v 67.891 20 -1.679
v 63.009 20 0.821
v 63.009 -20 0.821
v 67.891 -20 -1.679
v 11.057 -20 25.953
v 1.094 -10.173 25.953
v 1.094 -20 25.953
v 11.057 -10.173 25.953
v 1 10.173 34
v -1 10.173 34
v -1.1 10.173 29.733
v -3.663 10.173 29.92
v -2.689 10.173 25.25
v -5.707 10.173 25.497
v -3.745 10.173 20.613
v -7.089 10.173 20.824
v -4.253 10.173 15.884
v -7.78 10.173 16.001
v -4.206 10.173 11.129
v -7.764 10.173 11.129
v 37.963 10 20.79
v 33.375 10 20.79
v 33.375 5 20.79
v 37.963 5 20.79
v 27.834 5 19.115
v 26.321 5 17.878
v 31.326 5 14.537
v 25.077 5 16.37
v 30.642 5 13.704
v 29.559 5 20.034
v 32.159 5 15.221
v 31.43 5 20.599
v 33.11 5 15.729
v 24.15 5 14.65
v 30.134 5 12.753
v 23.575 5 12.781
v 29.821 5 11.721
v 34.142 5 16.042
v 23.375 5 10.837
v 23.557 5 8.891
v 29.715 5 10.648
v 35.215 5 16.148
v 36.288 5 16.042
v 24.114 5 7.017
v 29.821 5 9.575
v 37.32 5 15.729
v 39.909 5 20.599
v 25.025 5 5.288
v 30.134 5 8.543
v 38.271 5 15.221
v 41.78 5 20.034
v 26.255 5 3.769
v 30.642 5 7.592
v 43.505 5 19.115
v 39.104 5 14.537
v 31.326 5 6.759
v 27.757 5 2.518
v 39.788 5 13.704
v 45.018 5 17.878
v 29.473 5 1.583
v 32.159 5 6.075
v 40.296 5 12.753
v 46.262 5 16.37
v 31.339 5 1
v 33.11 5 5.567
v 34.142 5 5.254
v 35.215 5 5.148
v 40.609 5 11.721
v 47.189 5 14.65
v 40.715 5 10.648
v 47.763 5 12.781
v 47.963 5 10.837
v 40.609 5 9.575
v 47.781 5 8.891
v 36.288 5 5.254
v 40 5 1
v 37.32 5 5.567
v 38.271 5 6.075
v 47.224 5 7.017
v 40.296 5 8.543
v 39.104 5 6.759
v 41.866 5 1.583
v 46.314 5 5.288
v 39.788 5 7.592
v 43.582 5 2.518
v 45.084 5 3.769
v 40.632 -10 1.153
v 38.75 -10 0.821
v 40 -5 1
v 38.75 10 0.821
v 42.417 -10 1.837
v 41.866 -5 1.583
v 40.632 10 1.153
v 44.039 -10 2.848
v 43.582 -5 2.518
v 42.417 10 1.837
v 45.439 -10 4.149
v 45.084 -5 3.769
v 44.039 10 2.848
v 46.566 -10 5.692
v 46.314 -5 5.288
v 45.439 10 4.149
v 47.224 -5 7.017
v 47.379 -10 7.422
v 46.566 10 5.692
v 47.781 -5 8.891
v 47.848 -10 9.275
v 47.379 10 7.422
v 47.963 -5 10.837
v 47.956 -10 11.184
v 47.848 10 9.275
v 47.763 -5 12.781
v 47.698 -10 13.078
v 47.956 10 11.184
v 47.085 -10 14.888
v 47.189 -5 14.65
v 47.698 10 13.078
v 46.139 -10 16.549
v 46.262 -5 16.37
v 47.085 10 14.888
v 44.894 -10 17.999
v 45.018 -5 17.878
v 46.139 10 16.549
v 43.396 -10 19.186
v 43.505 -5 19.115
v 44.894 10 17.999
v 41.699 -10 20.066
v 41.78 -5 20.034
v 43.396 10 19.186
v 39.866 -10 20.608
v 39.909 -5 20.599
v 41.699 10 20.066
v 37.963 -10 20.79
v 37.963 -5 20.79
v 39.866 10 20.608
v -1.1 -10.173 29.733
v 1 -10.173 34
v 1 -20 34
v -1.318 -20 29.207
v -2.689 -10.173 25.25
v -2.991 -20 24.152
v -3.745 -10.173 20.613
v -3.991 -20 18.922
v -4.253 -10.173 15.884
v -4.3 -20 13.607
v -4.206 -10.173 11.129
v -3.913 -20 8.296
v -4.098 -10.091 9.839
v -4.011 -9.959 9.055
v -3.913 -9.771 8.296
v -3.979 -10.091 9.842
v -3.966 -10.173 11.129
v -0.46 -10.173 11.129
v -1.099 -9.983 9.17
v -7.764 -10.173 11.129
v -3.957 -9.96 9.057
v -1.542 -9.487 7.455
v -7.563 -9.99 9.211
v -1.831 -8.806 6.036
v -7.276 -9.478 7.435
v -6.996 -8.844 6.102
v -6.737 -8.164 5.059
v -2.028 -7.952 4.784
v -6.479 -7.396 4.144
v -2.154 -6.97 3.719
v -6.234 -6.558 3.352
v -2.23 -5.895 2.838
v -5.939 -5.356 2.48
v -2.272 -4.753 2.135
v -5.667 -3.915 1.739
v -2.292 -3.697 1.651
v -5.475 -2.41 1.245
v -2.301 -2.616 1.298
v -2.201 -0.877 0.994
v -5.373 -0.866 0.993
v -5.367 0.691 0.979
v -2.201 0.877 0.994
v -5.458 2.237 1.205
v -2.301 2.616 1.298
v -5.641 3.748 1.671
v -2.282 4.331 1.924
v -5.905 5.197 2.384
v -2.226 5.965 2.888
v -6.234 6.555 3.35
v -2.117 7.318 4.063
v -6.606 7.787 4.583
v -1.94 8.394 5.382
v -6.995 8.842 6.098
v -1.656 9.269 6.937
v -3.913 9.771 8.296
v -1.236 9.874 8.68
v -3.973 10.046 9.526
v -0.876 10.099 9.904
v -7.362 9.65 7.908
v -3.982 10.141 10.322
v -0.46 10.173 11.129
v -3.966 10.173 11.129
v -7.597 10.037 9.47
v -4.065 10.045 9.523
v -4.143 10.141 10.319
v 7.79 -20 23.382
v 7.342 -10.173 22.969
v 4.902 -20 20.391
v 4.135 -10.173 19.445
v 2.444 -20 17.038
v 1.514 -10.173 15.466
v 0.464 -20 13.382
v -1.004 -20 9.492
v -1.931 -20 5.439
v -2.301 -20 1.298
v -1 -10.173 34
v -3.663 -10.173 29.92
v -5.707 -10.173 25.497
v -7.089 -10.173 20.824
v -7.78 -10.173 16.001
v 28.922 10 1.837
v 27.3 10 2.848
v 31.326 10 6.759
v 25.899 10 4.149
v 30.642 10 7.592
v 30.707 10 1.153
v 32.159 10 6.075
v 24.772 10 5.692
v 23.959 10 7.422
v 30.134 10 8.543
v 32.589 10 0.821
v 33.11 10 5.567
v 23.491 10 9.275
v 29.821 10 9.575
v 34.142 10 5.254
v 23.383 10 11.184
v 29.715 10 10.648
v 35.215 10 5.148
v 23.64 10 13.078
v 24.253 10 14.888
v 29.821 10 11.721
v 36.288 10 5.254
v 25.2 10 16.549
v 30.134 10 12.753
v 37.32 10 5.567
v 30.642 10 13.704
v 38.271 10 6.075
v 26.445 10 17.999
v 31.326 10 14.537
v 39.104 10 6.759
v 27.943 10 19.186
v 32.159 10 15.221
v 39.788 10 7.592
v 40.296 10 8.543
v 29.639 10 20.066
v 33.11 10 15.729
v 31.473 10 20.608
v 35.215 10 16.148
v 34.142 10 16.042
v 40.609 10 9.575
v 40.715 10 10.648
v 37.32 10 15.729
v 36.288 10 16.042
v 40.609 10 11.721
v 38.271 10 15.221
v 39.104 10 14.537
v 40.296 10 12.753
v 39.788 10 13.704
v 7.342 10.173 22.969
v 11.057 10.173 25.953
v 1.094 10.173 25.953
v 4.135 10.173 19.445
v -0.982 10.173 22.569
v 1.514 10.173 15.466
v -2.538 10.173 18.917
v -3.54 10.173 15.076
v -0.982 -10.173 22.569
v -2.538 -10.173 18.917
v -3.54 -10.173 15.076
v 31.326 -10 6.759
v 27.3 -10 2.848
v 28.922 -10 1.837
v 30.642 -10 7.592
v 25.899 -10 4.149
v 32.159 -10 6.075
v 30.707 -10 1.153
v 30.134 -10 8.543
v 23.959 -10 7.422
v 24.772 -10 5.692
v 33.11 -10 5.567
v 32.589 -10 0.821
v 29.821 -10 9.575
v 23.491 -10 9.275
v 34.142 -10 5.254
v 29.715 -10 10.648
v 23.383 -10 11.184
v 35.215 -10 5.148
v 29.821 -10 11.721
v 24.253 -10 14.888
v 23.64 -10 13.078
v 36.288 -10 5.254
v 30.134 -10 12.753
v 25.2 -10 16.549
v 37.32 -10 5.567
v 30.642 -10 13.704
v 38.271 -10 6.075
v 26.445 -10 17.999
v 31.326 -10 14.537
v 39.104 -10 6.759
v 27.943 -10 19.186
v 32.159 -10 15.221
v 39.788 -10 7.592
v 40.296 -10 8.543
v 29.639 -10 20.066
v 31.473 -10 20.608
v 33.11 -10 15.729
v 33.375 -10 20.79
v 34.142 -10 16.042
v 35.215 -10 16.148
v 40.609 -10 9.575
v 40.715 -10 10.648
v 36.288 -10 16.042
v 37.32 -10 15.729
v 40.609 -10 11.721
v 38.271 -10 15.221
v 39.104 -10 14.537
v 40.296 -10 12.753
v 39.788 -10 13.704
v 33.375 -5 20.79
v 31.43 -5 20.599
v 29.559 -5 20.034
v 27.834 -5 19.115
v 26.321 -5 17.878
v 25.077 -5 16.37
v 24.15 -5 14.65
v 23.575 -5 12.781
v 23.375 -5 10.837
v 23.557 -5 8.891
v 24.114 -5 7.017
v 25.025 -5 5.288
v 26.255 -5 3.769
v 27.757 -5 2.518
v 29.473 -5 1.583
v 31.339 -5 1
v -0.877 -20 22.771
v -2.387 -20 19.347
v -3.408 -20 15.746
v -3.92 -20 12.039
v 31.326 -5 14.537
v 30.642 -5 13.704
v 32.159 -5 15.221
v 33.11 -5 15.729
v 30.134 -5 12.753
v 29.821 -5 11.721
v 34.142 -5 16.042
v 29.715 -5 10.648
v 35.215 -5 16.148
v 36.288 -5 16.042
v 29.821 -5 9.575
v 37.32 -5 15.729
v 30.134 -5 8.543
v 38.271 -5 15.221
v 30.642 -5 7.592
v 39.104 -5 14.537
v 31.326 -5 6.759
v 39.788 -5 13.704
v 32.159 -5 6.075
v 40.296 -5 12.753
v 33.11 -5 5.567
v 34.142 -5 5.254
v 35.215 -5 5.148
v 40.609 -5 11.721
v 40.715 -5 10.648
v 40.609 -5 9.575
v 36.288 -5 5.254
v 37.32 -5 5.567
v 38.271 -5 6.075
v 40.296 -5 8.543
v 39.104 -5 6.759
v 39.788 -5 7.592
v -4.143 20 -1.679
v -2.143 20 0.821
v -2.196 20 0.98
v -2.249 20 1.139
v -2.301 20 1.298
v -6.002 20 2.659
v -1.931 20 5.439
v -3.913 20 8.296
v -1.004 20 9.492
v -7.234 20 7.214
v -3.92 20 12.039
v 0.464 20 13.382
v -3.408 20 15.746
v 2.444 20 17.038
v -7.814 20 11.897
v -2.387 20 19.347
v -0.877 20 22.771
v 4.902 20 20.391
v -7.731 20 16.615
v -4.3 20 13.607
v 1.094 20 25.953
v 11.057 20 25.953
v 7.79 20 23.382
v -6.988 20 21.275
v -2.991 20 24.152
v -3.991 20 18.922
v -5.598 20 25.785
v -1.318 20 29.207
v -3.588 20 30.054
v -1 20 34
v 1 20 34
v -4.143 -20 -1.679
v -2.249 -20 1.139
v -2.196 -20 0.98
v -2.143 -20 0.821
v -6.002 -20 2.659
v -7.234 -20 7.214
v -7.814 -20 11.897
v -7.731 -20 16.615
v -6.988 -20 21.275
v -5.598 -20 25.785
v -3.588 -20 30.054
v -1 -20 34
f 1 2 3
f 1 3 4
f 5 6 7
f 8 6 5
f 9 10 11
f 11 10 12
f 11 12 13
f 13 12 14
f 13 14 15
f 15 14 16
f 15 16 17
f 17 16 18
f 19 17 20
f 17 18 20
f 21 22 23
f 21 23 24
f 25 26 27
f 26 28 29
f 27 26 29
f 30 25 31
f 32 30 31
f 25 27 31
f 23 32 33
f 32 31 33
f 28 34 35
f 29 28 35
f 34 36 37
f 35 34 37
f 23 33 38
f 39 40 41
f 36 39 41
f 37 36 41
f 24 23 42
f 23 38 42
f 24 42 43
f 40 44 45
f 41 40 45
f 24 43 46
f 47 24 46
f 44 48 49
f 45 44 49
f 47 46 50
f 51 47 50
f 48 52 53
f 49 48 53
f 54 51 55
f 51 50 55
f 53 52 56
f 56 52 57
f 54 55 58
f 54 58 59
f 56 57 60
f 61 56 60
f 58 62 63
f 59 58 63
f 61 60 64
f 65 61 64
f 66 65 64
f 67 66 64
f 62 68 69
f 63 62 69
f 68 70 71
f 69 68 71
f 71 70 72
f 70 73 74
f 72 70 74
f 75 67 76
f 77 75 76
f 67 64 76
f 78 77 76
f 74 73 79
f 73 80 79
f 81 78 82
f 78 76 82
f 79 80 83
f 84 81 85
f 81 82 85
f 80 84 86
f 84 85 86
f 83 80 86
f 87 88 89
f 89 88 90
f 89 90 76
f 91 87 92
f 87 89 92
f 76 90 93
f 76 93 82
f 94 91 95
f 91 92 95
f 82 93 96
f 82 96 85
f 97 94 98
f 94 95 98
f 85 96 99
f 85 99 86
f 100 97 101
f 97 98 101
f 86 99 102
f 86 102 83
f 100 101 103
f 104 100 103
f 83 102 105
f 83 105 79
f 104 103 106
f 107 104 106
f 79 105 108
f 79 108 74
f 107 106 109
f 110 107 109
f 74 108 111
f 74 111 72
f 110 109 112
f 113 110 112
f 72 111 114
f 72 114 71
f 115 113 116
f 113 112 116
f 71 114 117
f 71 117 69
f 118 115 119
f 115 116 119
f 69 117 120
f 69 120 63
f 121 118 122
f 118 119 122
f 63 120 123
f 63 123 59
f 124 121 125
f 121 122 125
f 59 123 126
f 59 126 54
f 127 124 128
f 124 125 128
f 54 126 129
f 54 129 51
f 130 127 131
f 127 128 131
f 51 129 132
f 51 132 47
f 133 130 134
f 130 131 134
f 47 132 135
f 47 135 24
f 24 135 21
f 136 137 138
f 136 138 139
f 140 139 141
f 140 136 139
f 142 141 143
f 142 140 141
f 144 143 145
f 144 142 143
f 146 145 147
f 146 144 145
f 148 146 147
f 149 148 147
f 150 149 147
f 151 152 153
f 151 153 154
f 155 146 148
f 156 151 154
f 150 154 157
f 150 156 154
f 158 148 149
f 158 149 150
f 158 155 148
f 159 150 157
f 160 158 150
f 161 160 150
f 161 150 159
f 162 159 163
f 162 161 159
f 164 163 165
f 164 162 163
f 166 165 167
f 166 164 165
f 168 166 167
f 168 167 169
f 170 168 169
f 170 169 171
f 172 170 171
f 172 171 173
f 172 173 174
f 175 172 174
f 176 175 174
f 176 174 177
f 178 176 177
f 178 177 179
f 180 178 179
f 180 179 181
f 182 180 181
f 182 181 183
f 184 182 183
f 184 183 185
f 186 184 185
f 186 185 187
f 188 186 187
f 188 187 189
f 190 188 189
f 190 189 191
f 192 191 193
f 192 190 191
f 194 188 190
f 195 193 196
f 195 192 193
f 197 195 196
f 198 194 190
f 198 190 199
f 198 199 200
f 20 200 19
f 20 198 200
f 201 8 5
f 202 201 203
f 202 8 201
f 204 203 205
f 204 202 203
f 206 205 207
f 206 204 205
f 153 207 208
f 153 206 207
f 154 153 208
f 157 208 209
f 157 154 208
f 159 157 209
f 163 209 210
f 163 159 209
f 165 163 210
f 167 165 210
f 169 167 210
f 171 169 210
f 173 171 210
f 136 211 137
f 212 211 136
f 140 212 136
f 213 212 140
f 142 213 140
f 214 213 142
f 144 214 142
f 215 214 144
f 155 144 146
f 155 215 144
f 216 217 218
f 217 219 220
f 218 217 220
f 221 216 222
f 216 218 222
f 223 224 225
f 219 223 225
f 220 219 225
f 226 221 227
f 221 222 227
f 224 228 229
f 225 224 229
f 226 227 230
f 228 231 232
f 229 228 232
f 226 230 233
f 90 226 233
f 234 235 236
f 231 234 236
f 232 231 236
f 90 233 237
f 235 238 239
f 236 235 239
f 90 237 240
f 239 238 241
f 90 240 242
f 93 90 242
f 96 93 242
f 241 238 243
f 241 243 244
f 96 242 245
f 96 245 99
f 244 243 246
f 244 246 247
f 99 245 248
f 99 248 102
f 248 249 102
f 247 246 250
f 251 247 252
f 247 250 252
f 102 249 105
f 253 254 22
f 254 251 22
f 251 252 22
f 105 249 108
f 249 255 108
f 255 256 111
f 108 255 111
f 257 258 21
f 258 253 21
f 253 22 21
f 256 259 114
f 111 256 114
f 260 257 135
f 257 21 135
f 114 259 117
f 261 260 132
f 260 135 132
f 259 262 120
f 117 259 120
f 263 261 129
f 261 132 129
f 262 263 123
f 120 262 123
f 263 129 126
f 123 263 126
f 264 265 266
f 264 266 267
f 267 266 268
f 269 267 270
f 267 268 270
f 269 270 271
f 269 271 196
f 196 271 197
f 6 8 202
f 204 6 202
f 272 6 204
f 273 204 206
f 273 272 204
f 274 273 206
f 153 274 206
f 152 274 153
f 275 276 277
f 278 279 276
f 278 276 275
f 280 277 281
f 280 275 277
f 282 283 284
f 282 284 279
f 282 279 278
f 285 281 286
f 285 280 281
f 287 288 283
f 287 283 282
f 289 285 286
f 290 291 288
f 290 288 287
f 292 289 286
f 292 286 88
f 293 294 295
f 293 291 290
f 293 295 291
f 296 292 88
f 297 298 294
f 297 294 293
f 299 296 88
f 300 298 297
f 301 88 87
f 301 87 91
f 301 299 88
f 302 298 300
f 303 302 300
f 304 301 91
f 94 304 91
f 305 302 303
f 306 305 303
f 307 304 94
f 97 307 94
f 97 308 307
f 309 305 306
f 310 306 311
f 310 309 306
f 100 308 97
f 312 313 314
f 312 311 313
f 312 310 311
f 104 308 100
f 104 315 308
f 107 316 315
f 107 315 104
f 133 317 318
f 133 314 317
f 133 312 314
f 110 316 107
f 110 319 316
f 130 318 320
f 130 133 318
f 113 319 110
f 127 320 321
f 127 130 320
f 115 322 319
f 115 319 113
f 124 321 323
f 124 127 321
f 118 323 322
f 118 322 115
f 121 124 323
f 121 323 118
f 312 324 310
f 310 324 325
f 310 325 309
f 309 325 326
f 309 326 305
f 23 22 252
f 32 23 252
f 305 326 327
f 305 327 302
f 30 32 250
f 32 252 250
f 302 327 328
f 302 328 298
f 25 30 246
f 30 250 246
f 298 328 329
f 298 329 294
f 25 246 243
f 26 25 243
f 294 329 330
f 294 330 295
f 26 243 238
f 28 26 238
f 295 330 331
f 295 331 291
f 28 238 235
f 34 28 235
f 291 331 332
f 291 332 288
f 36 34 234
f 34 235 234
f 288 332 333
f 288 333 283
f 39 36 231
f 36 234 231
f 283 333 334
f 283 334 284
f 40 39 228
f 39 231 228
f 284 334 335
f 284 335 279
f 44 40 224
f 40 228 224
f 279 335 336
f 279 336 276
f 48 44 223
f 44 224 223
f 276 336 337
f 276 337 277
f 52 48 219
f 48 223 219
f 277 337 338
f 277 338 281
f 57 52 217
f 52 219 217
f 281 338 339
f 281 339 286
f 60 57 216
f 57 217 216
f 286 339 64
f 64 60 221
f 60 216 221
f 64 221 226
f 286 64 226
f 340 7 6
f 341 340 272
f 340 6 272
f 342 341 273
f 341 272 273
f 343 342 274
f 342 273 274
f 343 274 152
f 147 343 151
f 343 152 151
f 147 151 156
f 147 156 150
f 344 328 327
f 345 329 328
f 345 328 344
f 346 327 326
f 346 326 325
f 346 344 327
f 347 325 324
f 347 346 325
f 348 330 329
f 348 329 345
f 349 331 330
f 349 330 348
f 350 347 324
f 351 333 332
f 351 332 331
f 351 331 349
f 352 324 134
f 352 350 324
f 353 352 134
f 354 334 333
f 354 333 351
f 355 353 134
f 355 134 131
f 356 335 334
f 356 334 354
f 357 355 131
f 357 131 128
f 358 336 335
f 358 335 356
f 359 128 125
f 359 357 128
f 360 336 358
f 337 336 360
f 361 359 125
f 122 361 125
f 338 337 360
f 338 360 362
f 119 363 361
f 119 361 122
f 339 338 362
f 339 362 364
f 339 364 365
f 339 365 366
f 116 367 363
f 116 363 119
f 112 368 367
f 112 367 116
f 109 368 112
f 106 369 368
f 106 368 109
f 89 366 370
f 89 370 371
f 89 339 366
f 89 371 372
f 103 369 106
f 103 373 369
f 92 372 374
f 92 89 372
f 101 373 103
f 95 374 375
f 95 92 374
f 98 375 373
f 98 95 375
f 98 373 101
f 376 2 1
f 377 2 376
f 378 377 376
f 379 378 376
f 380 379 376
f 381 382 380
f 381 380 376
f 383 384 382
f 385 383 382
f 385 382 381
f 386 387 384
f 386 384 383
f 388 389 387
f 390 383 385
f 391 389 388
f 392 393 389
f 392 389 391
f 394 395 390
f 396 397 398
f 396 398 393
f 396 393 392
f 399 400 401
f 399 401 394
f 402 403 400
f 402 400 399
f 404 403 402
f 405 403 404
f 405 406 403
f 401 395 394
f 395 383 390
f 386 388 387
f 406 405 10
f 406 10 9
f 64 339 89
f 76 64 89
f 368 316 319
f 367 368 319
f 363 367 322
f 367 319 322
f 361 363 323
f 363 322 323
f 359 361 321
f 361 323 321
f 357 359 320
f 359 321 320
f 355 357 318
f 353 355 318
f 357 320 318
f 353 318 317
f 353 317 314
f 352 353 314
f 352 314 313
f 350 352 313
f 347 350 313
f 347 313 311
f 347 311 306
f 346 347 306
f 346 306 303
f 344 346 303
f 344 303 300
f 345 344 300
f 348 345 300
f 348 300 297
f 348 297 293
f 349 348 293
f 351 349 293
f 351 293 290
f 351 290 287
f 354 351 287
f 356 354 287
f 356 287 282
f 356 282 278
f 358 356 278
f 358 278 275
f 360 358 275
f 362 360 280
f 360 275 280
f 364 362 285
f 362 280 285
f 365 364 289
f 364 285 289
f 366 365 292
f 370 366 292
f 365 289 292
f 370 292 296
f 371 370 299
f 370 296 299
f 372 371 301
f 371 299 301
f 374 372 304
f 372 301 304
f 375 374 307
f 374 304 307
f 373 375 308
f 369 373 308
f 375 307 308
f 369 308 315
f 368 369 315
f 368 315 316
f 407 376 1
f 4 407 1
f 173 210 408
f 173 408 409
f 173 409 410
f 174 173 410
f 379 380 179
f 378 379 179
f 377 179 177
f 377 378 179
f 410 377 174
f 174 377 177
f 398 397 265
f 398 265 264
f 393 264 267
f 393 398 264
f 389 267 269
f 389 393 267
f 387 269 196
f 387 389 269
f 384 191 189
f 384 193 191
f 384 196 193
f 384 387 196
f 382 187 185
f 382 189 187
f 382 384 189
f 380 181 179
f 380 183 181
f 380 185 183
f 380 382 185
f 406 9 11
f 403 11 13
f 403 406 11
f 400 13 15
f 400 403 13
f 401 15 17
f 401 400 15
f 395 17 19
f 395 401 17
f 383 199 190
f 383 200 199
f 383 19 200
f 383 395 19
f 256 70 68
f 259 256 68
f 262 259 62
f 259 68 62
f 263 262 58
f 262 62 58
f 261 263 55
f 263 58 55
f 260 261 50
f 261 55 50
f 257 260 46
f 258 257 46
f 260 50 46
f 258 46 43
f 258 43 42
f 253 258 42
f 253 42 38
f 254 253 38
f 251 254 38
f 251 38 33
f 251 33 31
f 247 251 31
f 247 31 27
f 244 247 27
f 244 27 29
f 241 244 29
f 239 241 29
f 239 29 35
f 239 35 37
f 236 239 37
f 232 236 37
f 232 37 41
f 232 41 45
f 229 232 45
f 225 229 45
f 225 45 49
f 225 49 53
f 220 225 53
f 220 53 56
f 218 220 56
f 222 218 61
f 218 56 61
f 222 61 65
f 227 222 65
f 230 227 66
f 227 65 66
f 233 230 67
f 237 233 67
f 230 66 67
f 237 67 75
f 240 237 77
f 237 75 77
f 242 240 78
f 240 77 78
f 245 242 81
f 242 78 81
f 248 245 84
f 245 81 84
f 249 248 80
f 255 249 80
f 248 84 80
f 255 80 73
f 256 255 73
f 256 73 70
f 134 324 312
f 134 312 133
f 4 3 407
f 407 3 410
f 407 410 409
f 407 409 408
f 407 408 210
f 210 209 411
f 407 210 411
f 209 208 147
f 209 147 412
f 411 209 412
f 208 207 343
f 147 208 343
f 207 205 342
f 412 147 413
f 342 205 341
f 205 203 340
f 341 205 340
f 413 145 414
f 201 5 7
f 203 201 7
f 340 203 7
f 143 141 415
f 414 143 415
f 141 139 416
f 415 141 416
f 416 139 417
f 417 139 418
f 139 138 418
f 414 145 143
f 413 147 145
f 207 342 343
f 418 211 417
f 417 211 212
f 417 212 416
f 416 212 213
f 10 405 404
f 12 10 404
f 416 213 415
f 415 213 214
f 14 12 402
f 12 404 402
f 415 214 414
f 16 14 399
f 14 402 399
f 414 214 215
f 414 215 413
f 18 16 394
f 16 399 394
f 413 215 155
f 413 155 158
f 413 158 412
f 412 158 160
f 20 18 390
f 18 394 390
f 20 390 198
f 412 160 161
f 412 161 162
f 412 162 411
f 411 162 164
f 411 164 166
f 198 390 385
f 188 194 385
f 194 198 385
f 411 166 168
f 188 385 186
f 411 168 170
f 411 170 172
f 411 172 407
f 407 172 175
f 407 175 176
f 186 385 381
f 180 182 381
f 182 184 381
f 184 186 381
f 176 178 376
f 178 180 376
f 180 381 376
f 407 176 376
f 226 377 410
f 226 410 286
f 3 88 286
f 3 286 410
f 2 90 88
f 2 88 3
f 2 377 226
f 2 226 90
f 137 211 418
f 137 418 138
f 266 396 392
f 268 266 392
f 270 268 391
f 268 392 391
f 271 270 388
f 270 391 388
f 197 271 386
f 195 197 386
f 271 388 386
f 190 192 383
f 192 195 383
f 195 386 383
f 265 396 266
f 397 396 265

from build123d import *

# Parameters (mm, degrees)
PAD008_DEPTH = 30
SKETCH003_W  = 24.676034
SKETCH003_H  = 10
PAD002_DEPTH = 25
PAD001_DEPTH = 20
SKETCH002_R  = 5.5
POCKET_DEPTH = 24
PAD007_DEPTH = 40
PAD_DEPTH    = 40


with BuildPart() as pad008:
    # Sketch009 → Pad008 (new body)
    with BuildSketch(Plane.YZ.offset(-17)):
        with BuildLine():
            ThreePointArc((10.172884, 61.128702), (0, 71.301585), (-10.172884, 61.128702))
            Line((-10.172884, 61.128702), (-10.172884, 11.128702))
            ThreePointArc((-10.172884, 11.128702), (0, 0.955818), (10.172884, 11.128702))
            Line((10.172884, 61.128702), (10.172884, 11.128702))
        make_face()
    extrude(amount=PAD008_DEPTH)


with BuildPart() as pad002:
    # Sketch003 → Pad002 (new body)
    with BuildSketch(Plane(origin=(10, 0, 1), x_dir=(1, 0, 0), z_dir=(0, 0, 1))):
        with Locations((25.629245, 0)):
            Rectangle(SKETCH003_W, SKETCH003_H)
    extrude(amount=PAD002_DEPTH)


with BuildPart() as cut:
    # Sketch001 → Pad001 (new body)
    with BuildSketch(Plane(origin=(10, 10, 0), x_dir=(1, 0, 0), z_dir=(0, -1, 0))):
        with BuildLine():
            ThreePointArc((23.375231, 20.790424), (13.375231, 10.790424), (23.375231, 0.790424))
            Line((23.375231, 0.790424), (27.963482, 0.790424))
            ThreePointArc((27.963482, 0.790424), (37.963482, 10.790424), (27.963482, 20.790424))
            Line((23.375231, 20.790424), (27.963482, 20.790424))
        make_face()
    extrude(amount=PAD001_DEPTH)

    # Sketch002 → Pocket (cut)
    with BuildSketch(Plane(origin=(10, -10, 0), x_dir=(1, 0, 0), z_dir=(0, -1, 0))):
        with Locations((25.214981, 10.647934)):
            Circle(SKETCH002_R)
    extrude(amount=-POCKET_DEPTH, mode=Mode.SUBTRACT)

    # Cut: cut Pad002
    add(pad002.part, mode=Mode.SUBTRACT)


with BuildPart() as pad007:
    # Sketch008 → Pad007 (new body)
    with BuildSketch(Plane.XZ.offset(-20)):
        with BuildLine():
            ThreePointArc((11.056906, 25.953392), (1.290425, 15.054425), (-2.307496, 0.868989))
            ThreePointArc((1.093916, 25.953392), (-3.737473, 13.835707), (-2.307496, 0.868989))
            Line((1.093916, 25.953392), (11.056906, 25.953392))
        make_face()
    extrude(amount=PAD007_DEPTH)


with BuildPart() as cut001:
    # Sketch → Pad (new body)
    with BuildSketch(Plane.XZ.offset(-20)):
        with BuildLine():
            Line((-4.143037, -1.678632), (67.891418, -1.678632))
            Line((63.009144, 0.821368), (67.891418, -1.678632))
            Line((-2.143037, 0.821368), (63.009144, 0.821368))
            ThreePointArc((1, 34), (-4.119497, 17.746787), (-2.143037, 0.821368))
            Line((-1, 34), (1, 34))
            ThreePointArc((-1, 34), (-7.73146, 16.615239), (-4.143037, -1.678632))
        make_face()
    extrude(amount=PAD_DEPTH)

    # Fusion001: union Cut, Pad007
    add(cut.part)
    add(pad007.part)

    # Cut001: cut Pad008
    add(pad008.part, mode=Mode.SUBTRACT)


solid = cut001.part
